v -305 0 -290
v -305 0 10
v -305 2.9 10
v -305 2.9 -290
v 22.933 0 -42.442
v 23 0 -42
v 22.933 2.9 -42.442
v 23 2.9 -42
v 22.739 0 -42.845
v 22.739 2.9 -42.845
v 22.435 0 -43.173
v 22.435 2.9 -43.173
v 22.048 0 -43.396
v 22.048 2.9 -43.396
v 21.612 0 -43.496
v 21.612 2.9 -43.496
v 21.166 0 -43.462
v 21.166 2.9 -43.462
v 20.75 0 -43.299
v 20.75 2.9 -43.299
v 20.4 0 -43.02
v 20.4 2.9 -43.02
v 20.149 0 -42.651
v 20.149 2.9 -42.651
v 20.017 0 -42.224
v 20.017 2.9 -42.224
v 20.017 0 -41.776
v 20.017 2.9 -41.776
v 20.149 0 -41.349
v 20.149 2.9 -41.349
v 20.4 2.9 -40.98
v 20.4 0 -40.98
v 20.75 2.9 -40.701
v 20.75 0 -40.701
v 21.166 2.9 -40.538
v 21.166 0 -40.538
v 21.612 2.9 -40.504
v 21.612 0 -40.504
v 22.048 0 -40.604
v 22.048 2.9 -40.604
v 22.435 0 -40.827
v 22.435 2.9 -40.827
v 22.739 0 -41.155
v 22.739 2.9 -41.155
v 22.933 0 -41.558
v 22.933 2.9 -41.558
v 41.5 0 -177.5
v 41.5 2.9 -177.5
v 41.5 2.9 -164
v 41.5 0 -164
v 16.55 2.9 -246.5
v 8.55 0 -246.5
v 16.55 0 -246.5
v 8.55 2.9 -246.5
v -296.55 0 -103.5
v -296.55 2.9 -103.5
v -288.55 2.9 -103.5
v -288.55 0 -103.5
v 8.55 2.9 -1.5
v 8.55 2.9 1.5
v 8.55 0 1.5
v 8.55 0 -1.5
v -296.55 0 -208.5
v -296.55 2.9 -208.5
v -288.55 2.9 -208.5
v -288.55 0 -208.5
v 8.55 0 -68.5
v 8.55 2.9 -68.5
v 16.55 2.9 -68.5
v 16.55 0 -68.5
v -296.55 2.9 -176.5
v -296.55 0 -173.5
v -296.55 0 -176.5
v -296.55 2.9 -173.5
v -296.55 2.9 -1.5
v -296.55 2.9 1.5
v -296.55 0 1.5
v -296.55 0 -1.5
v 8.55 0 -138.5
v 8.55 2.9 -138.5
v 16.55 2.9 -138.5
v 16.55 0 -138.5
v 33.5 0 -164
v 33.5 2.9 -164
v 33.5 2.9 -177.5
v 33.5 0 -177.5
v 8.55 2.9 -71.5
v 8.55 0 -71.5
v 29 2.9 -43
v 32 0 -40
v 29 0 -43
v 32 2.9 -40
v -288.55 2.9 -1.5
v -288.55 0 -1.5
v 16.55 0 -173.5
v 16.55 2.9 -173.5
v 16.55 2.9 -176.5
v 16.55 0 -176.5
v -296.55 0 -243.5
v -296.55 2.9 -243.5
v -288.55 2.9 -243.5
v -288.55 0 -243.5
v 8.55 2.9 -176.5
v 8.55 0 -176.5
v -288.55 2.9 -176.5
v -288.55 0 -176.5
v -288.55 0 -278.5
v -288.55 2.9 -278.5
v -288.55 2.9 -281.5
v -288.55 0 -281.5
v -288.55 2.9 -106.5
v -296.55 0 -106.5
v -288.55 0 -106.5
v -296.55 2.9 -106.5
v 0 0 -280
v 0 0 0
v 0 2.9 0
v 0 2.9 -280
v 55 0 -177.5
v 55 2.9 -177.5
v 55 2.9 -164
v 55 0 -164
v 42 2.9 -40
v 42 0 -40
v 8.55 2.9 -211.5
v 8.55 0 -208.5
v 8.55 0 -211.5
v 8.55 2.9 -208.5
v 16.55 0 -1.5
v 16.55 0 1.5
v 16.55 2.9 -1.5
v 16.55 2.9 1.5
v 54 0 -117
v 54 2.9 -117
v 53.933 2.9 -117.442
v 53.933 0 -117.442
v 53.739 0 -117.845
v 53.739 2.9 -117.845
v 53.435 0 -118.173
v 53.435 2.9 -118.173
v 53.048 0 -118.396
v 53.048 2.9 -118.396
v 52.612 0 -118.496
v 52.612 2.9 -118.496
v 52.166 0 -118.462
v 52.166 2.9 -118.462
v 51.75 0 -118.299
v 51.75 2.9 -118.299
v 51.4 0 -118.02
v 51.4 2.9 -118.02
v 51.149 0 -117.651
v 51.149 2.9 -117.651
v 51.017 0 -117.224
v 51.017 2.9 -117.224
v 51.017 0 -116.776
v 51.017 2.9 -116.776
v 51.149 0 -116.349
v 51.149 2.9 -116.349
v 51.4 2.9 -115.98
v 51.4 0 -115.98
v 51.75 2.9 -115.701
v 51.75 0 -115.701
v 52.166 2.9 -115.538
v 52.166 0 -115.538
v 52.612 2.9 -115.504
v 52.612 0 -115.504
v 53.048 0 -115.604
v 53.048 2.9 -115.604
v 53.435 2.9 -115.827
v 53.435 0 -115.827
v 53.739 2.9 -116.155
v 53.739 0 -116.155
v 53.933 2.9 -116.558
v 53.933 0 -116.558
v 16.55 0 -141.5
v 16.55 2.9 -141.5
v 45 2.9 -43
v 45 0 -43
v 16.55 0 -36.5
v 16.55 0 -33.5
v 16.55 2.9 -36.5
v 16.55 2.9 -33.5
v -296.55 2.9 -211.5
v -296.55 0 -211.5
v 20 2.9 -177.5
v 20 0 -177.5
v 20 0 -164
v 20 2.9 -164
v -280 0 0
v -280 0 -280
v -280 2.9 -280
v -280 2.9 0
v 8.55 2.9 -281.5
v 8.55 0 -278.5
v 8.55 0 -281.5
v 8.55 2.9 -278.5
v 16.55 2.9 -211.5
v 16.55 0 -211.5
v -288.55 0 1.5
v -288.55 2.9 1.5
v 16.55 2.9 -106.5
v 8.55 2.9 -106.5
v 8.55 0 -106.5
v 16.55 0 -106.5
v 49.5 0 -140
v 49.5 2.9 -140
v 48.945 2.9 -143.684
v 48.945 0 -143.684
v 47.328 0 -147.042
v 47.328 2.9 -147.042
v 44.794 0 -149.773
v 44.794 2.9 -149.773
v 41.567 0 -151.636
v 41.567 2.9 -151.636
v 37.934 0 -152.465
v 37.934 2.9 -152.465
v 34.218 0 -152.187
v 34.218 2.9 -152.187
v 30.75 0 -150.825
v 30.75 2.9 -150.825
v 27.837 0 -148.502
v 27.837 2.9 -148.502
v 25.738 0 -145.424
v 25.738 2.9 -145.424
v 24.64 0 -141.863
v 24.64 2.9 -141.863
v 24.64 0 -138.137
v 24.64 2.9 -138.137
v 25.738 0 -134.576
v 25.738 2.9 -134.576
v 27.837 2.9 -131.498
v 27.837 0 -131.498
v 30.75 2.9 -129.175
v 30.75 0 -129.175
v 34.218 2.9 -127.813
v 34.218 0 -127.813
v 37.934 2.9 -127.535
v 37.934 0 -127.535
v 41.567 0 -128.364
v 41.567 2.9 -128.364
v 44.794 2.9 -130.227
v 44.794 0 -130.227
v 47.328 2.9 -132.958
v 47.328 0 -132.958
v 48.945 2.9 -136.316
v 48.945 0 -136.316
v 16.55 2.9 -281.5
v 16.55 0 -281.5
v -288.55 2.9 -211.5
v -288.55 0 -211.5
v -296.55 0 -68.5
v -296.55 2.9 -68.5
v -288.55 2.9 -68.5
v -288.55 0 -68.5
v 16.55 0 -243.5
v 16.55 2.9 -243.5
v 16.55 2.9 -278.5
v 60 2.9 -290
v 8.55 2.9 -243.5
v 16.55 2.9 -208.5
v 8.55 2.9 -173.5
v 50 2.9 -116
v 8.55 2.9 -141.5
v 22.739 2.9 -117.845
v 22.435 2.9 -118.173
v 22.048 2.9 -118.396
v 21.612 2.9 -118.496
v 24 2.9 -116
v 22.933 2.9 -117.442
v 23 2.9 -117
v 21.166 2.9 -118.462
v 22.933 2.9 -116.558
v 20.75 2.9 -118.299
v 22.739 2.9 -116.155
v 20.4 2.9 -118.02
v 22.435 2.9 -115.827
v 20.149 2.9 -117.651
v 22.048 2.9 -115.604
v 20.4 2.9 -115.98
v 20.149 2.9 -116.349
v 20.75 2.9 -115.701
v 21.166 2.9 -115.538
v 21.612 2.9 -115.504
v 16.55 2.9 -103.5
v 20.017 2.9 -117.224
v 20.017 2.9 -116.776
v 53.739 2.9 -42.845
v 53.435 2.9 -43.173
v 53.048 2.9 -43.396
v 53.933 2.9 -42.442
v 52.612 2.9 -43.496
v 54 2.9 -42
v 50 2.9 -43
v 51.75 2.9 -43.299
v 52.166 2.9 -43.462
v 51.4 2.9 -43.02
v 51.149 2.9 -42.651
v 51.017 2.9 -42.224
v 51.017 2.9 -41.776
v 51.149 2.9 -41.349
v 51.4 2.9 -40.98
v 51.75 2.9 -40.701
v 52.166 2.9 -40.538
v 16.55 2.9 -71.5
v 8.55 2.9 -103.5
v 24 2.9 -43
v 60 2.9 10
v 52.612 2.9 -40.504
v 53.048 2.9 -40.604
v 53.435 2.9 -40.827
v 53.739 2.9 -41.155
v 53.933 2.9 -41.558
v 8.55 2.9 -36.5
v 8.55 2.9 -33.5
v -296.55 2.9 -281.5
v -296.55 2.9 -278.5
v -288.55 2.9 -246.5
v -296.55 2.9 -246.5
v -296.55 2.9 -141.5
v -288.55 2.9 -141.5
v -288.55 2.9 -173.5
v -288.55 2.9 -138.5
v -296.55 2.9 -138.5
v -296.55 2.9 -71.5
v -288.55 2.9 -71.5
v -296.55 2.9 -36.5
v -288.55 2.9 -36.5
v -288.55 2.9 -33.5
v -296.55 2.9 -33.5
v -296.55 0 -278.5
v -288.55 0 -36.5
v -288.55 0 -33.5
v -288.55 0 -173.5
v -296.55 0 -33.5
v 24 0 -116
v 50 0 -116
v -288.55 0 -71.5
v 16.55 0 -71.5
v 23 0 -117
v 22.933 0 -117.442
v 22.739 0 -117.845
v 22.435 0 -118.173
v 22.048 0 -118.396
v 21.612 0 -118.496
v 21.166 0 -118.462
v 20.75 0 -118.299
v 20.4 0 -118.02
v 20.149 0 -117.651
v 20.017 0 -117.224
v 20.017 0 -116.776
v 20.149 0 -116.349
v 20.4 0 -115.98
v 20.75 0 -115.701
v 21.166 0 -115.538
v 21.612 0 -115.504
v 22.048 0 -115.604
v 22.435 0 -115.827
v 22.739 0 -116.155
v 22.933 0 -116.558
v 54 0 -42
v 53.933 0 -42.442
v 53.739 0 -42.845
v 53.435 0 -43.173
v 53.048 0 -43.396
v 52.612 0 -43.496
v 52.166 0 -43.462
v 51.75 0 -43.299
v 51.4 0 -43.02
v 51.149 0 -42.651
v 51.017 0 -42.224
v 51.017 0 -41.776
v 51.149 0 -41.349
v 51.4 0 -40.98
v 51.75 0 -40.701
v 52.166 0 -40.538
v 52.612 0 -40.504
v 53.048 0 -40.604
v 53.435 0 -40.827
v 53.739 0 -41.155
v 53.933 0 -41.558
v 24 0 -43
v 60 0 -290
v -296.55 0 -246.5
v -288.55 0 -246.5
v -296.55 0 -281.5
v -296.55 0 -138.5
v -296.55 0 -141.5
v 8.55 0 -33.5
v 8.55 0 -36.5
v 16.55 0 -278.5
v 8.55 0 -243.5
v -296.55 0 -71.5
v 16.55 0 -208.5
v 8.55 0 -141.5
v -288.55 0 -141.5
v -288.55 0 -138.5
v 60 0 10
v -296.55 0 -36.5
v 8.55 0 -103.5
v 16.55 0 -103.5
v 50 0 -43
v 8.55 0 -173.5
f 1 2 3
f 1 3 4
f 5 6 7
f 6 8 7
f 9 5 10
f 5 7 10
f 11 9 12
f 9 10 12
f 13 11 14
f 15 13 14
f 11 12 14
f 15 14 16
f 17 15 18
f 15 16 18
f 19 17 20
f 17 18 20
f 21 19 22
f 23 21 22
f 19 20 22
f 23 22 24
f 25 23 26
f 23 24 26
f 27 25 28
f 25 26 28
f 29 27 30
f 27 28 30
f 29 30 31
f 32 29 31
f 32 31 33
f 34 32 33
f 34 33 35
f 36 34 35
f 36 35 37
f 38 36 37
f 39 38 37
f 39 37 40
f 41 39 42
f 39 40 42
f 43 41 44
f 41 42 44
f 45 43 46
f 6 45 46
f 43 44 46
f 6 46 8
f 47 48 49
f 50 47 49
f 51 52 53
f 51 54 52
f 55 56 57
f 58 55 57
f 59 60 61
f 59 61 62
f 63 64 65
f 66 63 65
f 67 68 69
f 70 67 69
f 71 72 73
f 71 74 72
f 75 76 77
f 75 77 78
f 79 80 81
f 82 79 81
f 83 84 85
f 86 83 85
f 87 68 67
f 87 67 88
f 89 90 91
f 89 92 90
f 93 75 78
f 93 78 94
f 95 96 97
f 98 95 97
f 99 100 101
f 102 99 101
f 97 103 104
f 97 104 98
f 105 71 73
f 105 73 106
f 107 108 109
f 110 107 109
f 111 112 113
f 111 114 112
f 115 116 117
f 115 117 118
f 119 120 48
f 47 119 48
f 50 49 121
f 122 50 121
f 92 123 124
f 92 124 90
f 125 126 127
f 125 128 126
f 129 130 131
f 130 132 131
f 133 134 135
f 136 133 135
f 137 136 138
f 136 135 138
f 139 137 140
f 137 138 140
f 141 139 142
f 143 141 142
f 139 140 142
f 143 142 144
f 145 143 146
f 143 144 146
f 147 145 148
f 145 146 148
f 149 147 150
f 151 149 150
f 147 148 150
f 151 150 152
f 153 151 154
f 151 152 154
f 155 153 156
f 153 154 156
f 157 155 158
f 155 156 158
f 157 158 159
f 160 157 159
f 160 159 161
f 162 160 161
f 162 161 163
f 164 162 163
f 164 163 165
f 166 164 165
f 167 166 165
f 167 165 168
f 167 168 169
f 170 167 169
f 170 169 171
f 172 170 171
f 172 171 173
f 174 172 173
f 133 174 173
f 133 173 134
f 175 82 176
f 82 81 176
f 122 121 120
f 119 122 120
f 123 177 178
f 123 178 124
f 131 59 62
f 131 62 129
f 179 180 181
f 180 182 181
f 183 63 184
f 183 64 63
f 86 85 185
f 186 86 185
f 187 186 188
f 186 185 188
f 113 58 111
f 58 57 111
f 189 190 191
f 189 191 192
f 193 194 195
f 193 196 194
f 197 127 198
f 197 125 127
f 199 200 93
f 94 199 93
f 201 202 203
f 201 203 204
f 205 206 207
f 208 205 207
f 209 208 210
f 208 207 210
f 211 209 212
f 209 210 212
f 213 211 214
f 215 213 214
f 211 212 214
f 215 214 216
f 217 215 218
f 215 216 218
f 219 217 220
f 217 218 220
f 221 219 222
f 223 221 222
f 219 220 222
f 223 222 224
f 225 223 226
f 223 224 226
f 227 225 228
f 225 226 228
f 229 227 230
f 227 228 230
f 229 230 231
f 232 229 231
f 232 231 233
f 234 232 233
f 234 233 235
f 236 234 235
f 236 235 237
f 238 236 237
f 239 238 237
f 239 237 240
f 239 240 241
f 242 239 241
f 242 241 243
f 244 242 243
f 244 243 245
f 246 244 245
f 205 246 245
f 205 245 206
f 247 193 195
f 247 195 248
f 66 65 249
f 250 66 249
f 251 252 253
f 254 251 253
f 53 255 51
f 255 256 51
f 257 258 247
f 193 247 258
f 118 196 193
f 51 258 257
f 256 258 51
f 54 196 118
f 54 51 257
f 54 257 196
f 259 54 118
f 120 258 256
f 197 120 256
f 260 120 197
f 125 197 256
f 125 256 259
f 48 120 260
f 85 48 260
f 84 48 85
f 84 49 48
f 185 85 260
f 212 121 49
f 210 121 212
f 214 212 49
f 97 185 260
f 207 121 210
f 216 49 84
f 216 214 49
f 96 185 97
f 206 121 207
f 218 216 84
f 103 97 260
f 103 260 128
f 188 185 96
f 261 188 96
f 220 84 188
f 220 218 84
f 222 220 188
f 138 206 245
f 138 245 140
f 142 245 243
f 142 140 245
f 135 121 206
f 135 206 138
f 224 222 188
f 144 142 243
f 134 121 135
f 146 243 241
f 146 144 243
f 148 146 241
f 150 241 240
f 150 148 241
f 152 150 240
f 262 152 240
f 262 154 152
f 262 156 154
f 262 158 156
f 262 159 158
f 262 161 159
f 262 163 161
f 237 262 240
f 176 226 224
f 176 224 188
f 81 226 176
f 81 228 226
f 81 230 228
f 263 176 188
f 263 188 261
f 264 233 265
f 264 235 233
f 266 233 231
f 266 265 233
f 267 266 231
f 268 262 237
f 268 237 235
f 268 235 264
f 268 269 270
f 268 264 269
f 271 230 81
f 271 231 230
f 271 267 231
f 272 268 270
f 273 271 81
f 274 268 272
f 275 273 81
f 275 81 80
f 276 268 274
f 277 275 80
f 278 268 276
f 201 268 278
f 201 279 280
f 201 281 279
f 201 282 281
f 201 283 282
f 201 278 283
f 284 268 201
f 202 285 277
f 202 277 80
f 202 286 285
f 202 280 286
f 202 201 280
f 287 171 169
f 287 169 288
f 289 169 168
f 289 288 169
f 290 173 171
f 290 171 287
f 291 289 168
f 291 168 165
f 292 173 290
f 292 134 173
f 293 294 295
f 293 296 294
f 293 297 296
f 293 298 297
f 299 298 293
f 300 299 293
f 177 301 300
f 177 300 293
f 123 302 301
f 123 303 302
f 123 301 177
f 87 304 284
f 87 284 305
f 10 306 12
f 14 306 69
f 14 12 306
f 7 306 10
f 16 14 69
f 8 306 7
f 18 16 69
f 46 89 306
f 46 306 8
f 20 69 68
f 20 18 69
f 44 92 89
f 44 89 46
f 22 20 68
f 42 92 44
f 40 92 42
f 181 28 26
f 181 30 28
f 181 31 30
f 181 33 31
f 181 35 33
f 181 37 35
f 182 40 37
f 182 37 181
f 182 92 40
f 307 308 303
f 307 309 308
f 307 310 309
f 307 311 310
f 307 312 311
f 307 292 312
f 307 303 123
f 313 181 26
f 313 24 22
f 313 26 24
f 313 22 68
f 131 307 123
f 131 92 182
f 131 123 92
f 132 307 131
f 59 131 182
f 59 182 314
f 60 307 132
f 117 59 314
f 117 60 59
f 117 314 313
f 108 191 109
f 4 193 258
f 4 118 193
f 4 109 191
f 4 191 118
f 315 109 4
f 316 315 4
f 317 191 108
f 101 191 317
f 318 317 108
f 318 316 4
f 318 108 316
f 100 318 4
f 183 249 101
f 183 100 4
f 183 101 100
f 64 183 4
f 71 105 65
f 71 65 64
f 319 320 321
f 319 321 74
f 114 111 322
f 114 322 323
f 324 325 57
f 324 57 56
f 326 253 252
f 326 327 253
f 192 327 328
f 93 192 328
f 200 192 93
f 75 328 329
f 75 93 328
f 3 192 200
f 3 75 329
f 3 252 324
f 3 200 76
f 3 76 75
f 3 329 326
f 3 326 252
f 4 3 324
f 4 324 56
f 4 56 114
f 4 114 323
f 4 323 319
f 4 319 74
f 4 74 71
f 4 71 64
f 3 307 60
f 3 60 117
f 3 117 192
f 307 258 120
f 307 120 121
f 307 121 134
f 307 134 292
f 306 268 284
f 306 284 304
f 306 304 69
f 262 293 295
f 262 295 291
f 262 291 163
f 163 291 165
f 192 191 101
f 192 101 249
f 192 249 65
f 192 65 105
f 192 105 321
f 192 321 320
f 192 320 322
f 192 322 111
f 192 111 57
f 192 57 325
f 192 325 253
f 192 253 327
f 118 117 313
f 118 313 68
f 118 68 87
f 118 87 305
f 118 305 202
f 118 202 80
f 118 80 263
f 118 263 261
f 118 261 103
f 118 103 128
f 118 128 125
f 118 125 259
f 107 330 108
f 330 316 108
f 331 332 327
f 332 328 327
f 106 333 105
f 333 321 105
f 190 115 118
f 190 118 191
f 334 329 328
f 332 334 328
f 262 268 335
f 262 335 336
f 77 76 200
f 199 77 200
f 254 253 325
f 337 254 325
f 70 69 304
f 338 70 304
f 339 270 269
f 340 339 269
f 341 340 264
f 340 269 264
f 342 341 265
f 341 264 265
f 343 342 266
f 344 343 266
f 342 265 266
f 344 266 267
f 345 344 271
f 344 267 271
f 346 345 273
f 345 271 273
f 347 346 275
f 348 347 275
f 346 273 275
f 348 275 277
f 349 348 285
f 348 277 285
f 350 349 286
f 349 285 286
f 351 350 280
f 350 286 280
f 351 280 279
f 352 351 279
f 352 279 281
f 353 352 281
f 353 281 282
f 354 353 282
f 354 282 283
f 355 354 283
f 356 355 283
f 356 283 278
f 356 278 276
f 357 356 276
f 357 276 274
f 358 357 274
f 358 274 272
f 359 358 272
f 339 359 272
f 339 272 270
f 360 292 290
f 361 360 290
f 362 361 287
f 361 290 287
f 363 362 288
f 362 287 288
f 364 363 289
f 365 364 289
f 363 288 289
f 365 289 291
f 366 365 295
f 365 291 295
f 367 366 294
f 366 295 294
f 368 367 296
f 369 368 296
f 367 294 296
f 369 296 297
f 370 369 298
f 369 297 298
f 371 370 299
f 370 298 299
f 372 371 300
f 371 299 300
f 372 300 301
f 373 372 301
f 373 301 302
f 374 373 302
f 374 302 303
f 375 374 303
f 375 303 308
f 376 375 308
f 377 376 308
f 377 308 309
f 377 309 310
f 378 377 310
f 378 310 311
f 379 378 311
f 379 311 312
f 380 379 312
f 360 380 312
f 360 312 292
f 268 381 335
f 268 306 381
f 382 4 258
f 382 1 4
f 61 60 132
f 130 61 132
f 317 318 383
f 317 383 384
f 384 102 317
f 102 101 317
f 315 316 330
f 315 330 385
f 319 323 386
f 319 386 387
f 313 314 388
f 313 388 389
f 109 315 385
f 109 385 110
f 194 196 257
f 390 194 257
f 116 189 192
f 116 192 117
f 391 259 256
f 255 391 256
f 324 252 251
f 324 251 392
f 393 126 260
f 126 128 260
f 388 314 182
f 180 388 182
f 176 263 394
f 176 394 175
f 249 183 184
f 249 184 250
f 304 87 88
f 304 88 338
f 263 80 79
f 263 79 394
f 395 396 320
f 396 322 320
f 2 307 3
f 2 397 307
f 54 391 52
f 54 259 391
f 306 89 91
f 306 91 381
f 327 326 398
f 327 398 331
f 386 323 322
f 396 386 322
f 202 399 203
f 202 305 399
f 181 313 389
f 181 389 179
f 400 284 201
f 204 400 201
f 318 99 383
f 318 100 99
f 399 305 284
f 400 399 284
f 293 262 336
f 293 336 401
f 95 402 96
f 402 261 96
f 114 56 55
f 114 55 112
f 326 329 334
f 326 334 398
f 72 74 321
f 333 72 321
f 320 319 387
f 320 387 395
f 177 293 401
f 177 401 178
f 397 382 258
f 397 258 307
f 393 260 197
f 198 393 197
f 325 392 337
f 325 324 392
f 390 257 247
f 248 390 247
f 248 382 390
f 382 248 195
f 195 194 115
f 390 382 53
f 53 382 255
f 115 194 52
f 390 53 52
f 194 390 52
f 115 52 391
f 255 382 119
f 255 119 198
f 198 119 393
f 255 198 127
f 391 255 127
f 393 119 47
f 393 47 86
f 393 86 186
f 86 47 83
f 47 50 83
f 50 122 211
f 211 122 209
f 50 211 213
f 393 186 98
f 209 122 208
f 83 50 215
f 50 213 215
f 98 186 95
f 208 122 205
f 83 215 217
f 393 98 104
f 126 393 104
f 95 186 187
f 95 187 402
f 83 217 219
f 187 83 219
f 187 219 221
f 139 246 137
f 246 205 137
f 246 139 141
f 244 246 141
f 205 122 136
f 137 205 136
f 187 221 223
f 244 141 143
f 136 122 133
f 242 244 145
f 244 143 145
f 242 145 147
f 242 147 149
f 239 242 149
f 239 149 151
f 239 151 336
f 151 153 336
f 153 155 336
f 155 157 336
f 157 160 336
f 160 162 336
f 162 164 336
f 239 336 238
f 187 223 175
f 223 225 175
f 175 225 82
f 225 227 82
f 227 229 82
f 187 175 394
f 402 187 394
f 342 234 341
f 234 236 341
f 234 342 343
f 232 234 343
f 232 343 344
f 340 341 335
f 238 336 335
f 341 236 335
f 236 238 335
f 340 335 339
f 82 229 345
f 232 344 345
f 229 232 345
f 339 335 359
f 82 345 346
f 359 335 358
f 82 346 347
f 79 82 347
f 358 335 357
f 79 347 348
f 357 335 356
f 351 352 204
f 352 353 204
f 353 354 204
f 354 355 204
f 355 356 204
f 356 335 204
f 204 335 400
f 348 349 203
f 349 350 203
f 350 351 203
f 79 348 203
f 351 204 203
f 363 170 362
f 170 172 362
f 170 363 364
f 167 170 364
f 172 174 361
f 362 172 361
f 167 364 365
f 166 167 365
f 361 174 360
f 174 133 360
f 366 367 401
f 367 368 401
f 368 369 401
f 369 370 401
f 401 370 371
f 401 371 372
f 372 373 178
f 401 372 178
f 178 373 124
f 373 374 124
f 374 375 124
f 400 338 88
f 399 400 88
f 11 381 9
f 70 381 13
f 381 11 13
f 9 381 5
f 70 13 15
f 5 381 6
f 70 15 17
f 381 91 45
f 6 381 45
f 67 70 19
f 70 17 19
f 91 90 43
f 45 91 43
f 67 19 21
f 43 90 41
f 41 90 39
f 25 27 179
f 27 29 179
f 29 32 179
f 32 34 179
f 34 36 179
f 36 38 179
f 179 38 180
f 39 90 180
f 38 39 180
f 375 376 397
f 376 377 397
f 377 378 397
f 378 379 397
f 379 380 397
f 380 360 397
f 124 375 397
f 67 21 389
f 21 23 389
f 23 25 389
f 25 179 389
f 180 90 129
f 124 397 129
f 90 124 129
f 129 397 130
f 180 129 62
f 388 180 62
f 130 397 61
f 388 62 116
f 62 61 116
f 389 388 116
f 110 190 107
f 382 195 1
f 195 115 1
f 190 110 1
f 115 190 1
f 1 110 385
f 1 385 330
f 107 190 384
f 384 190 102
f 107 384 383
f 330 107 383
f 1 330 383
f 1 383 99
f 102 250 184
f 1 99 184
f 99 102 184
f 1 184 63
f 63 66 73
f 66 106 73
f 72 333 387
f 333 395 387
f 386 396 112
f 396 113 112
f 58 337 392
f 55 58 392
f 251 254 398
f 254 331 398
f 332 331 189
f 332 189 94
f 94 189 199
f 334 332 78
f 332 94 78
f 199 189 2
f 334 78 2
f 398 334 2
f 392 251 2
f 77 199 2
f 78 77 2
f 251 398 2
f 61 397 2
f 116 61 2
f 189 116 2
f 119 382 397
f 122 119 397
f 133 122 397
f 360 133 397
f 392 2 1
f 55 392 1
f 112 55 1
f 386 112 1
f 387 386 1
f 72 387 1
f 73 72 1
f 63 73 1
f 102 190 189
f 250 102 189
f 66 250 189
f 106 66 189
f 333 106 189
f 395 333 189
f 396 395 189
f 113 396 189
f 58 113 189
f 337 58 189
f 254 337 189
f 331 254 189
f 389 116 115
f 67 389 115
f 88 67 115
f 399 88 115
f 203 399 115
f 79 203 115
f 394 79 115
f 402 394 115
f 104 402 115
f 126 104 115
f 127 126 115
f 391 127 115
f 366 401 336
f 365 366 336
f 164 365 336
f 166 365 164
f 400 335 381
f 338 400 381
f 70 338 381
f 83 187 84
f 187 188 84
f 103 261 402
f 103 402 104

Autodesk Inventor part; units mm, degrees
ref_plane "YZ Plane" through (0, 0, 0) normal (1, 0, 0) x (0, 1, 0)
ref_plane "XZ Plane" through (0, 0, 0) normal (0, 1, 0) x (-1, 0, 0)
ref_plane "XY Plane" through (0, 0, 0) normal (0, 0, 1) x (1, 0, 0)
sketch "Sketch1" plane through (0, 0, 0) normal (0, 1, 0) x (-1, 0, 0)
  line L0 (35, 0) -> (0, 0)
  line L1 (0, 0) -> (0, -35)
  line L2 (0, -35) -> (35, -35)
  line L3 (35, -35) -> (35, 0)
  line L4 (70, 0) -> (35, 0)
  line L5 (35, 0) -> (35, -35)
  line L6 (35, -35) -> (70, -35)
  line L7 (70, -35) -> (70, 0)
  line L8 (105, 0) -> (70, 0)
  line L9 (70, 0) -> (70, -35)
  line L10 (70, -35) -> (105, -35)
  line L11 (105, -35) -> (105, 0)
  line L12 (140, 0) -> (105, 0)
  line L13 (105, 0) -> (105, -35)
  line L14 (105, -35) -> (140, -35)
  line L15 (140, -35) -> (140, 0)
  line L16 (175, 0) -> (140, 0)
  line L17 (140, 0) -> (140, -35)
  line L18 (140, -35) -> (175, -35)
  line L19 (175, -35) -> (175, 0)
  line L20 (210, 0) -> (175, 0)
  line L21 (175, 0) -> (175, -35)
  line L22 (175, -35) -> (210, -35)
  line L23 (210, -35) -> (210, 0)
  line L24 (245, 0) -> (210, 0)
  line L25 (210, 0) -> (210, -35)
  line L26 (210, -35) -> (245, -35)
  line L27 (245, -35) -> (245, 0)
  line L28 (280, 0) -> (245, 0)
  line L29 (245, 0) -> (245, -35)
  line L30 (245, -35) -> (280, -35)
  line L31 (280, -35) -> (280, 0)
  line L32 (35, -35) -> (0, -35)
  line L33 (0, -35) -> (0, -70)
  line L34 (0, -70) -> (35, -70)
  line L35 (35, -70) -> (35, -35)
  line L36 (70, -35) -> (35, -35)
  line L37 (35, -35) -> (35, -70)
  line L38 (35, -70) -> (70, -70)
  line L39 (70, -70) -> (70, -35)
  line L40 (105, -35) -> (70, -35)
  line L41 (70, -35) -> (70, -70)
  line L42 (70, -70) -> (105, -70)
  line L43 (105, -70) -> (105, -35)
  line L44 (140, -35) -> (105, -35)
  line L45 (105, -35) -> (105, -70)
  line L46 (105, -70) -> (140, -70)
  line L47 (140, -70) -> (140, -35)
  line L48 (175, -35) -> (140, -35)
  line L49 (140, -35) -> (140, -70)
  line L50 (140, -70) -> (175, -70)
  line L51 (175, -70) -> (175, -35)
  line L52 (210, -35) -> (175, -35)
  line L53 (175, -35) -> (175, -70)
  line L54 (175, -70) -> (210, -70)
  line L55 (210, -70) -> (210, -35)
  line L56 (245, -35) -> (210, -35)
  line L57 (210, -35) -> (210, -70)
  line L58 (210, -70) -> (245, -70)
  line L59 (245, -70) -> (245, -35)
  line L60 (280, -35) -> (245, -35)
  line L61 (245, -35) -> (245, -70)
  line L62 (245, -70) -> (280, -70)
  line L63 (280, -70) -> (280, -35)
  line L64 (35, -70) -> (0, -70)
  line L65 (0, -70) -> (0, -105)
  line L66 (0, -105) -> (35, -105)
  line L67 (35, -105) -> (35, -70)
  line L68 (70, -70) -> (35, -70)
  line L69 (35, -70) -> (35, -105)
  line L70 (35, -105) -> (70, -105)
  line L71 (70, -105) -> (70, -70)
  line L72 (105, -70) -> (70, -70)
  line L73 (70, -70) -> (70, -105)
  line L74 (70, -105) -> (105, -105)
  line L75 (105, -105) -> (105, -70)
  line L76 (140, -70) -> (105, -70)
  line L77 (105, -70) -> (105, -105)
  line L78 (105, -105) -> (140, -105)
  line L79 (140, -105) -> (140, -70)
  line L80 (175, -70) -> (140, -70)
  line L81 (140, -70) -> (140, -105)
  line L82 (140, -105) -> (175, -105)
  line L83 (175, -105) -> (175, -70)
  line L84 (210, -70) -> (175, -70)
  line L85 (175, -70) -> (175, -105)
  line L86 (175, -105) -> (210, -105)
  line L87 (210, -105) -> (210, -70)
  line L88 (245, -70) -> (210, -70)
  line L89 (210, -70) -> (210, -105)
  line L90 (210, -105) -> (245, -105)
  line L91 (245, -105) -> (245, -70)
  line L92 (280, -70) -> (245, -70)
  line L93 (245, -70) -> (245, -105)
  line L94 (245, -105) -> (280, -105)
  line L95 (280, -105) -> (280, -70)
  line L96 (35, -105) -> (0, -105)
  line L97 (0, -105) -> (0, -140)
  line L98 (0, -140) -> (35, -140)
  line L99 (35, -140) -> (35, -105)
  line L100 (70, -105) -> (35, -105)
  line L101 (35, -105) -> (35, -140)
  line L102 (35, -140) -> (70, -140)
  line L103 (70, -140) -> (70, -105)
  line L104 (105, -105) -> (70, -105)
  line L105 (70, -105) -> (70, -140)
  line L106 (70, -140) -> (105, -140)
  line L107 (105, -140) -> (105, -105)
  line L108 (140, -105) -> (105, -105)
  line L109 (105, -105) -> (105, -140)
  line L110 (105, -140) -> (140, -140)
  line L111 (140, -140) -> (140, -105)
  line L112 (175, -105) -> (140, -105)
  line L113 (140, -105) -> (140, -140)
  line L114 (140, -140) -> (175, -140)
  line L115 (175, -140) -> (175, -105)
  line L116 (210, -105) -> (175, -105)
  line L117 (175, -105) -> (175, -140)
  line L118 (175, -140) -> (210, -140)
  line L119 (210, -140) -> (210, -105)
  line L120 (245, -105) -> (210, -105)
  line L121 (210, -105) -> (210, -140)
  line L122 (210, -140) -> (245, -140)
  line L123 (245, -140) -> (245, -105)
  line L124 (280, -105) -> (245, -105)
  line L125 (245, -105) -> (245, -140)
  line L126 (245, -140) -> (280, -140)
  line L127 (280, -140) -> (280, -105)
  line L128 (35, -140) -> (0, -140)
  line L129 (0, -140) -> (0, -175)
  line L130 (0, -175) -> (35, -175)
  line L131 (35, -175) -> (35, -140)
  line L132 (70, -140) -> (35, -140)
  line L133 (35, -140) -> (35, -175)
  line L134 (35, -175) -> (70, -175)
  line L135 (70, -175) -> (70, -140)
  line L136 (105, -140) -> (70, -140)
  line L137 (70, -140) -> (70, -175)
  line L138 (70, -175) -> (105, -175)
  line L139 (105, -175) -> (105, -140)
  line L140 (140, -140) -> (105, -140)
  line L141 (105, -140) -> (105, -175)
  line L142 (105, -175) -> (140, -175)
  line L143 (140, -175) -> (140, -140)
  line L144 (175, -140) -> (140, -140)
  line L145 (140, -140) -> (140, -175)
  line L146 (140, -175) -> (175, -175)
  line L147 (175, -175) -> (175, -140)
  line L148 (210, -140) -> (175, -140)
  line L149 (175, -140) -> (175, -175)
  line L150 (175, -175) -> (210, -175)
  line L151 (210, -175) -> (210, -140)
  line L152 (245, -140) -> (210, -140)
  line L153 (210, -140) -> (210, -175)
  line L154 (210, -175) -> (245, -175)
  line L155 (245, -175) -> (245, -140)
  line L156 (280, -140) -> (245, -140)
  line L157 (245, -140) -> (245, -175)
  line L158 (245, -175) -> (280, -175)
  line L159 (280, -175) -> (280, -140)
  line L160 (35, -175) -> (0, -175)
  line L161 (0, -175) -> (0, -210)
  line L162 (0, -210) -> (35, -210)
  line L163 (35, -210) -> (35, -175)
  line L164 (70, -175) -> (35, -175)
  line L165 (35, -175) -> (35, -210)
  line L166 (35, -210) -> (70, -210)
  line L167 (70, -210) -> (70, -175)
  line L168 (105, -175) -> (70, -175)
  line L169 (70, -175) -> (70, -210)
  line L170 (70, -210) -> (105, -210)
  line L171 (105, -210) -> (105, -175)
  line L172 (140, -175) -> (105, -175)
  line L173 (105, -175) -> (105, -210)
  line L174 (105, -210) -> (140, -210)
  line L175 (140, -210) -> (140, -175)
  line L176 (175, -175) -> (140, -175)
  line L177 (140, -175) -> (140, -210)
  line L178 (140, -210) -> (175, -210)
  line L179 (175, -210) -> (175, -175)
  line L180 (210, -175) -> (175, -175)
  line L181 (175, -175) -> (175, -210)
  line L182 (175, -210) -> (210, -210)
  line L183 (210, -210) -> (210, -175)
  line L184 (245, -175) -> (210, -175)
  line L185 (210, -175) -> (210, -210)
  line L186 (210, -210) -> (245, -210)
  line L187 (245, -210) -> (245, -175)
  line L188 (280, -175) -> (245, -175)
  line L189 (245, -175) -> (245, -210)
  line L190 (245, -210) -> (280, -210)
  line L191 (280, -210) -> (280, -175)
  line L192 (35, -210) -> (0, -210)
  line L193 (0, -210) -> (0, -245)
  line L194 (0, -245) -> (35, -245)
  line L195 (35, -245) -> (35, -210)
  line L196 (70, -210) -> (35, -210)
  line L197 (35, -210) -> (35, -245)
  line L198 (35, -245) -> (70, -245)
  line L199 (70, -245) -> (70, -210)
  line L200 (105, -210) -> (70, -210)
  line L201 (70, -210) -> (70, -245)
  line L202 (70, -245) -> (105, -245)
  line L203 (105, -245) -> (105, -210)
  line L204 (140, -210) -> (105, -210)
  line L205 (105, -210) -> (105, -245)
  line L206 (105, -245) -> (140, -245)
  line L207 (140, -245) -> (140, -210)
  line L208 (175, -210) -> (140, -210)
  line L209 (140, -210) -> (140, -245)
  line L210 (140, -245) -> (175, -245)
  line L211 (175, -245) -> (175, -210)
  line L212 (210, -210) -> (175, -210)
  line L213 (175, -210) -> (175, -245)
  line L214 (175, -245) -> (210, -245)
  line L215 (210, -245) -> (210, -210)
  line L216 (245, -210) -> (210, -210)
  line L217 (210, -210) -> (210, -245)
  line L218 (210, -245) -> (245, -245)
  line L219 (245, -245) -> (245, -210)
  line L220 (280, -210) -> (245, -210)
  line L221 (245, -210) -> (245, -245)
  line L222 (245, -245) -> (280, -245)
  line L223 (280, -245) -> (280, -210)
  line L224 (35, -245) -> (0, -245)
  line L225 (0, -245) -> (0, -280)
  line L226 (0, -280) -> (35, -280)
  line L227 (35, -280) -> (35, -245)
  line L228 (70, -245) -> (35, -245)
  line L229 (35, -245) -> (35, -280)
  line L230 (35, -280) -> (70, -280)
  line L231 (70, -280) -> (70, -245)
  line L232 (105, -245) -> (70, -245)
  line L233 (70, -245) -> (70, -280)
  line L234 (70, -280) -> (105, -280)
  line L235 (105, -280) -> (105, -245)
  line L236 (140, -245) -> (105, -245)
  line L237 (105, -245) -> (105, -280)
  line L238 (105, -280) -> (140, -280)
  line L239 (140, -280) -> (140, -245)
  line L240 (175, -245) -> (140, -245)
  line L241 (140, -245) -> (140, -280)
  line L242 (140, -280) -> (175, -280)
  line L243 (175, -280) -> (175, -245)
  line L244 (210, -245) -> (175, -245)
  line L245 (175, -245) -> (175, -280)
  line L246 (175, -280) -> (210, -280)
  line L247 (210, -280) -> (210, -245)
  line L248 (245, -245) -> (210, -245)
  line L249 (210, -245) -> (210, -280)
  line L250 (210, -280) -> (245, -280)
  line L251 (245, -280) -> (245, -245)
  line L252 (280, -245) -> (245, -245)
  line L253 (245, -245) -> (245, -280)
  line L254 (245, -280) -> (280, -280)
  line L255 (280, -280) -> (280, -245)
  line L256 (-60, 10) -> (305, 10)
  line L257 (305, 10) -> (305, -290)
  line L258 (305, -290) -> (-60, -290)
  line L259 (-60, -290) -> (-60, 10)
  point P0 (35, -70)
  point P1 (35, -70)
  point P2 (245, -105)
  point P3 (245, -105)
  point P4 (245, 0)
  point P5 (245, -35)
  point P6 (245, -35)
  point P7 (175, 0)
  point P8 (175, -35)
  point P9 (175, -35)
  point P10 (210, -35)
  point P11 (210, -35)
  point P12 (105, 0)
  point P13 (140, -35)
  point P14 (35, 0)
  point P15 (70, -35)
  point P16 (70, -35)
  point P17 (175, -70)
  point P18 (175, -70)
  point P19 (280, -35)
  point P20 (210, 0)
  point P21 (140, 0)
  point P22 (70, 0)
  dimension "d0" = 35
  dimension "d1" = 35
  dimension "d4" = 35
  dimension "d7" = 35
  dimension "d10" = 10
  dimension "d12" = 10
  dimension "d13" = 25
  dimension "d14" = 60
extrude "Border" add sketch "Sketch1" along normal blind 2.9
sketch "Sketch2" plane through (0, 2.9, 0) normal (0, 1, 0) x (1, 0, 0)
  line L0 (-296.55, 68.5) -> (-288.55, 68.5) projected
  line L1 (-288.55, 68.5) -> (-288.55, 71.5) projected
  line L2 (-296.55, 71.5) -> (-288.55, 71.5) projected
  line L3 (-296.55, 68.5) -> (-296.55, 71.5) projected
  line L4 (-296.55, 103.5) -> (-288.55, 103.5) projected
  line L5 (-288.55, 103.5) -> (-288.55, 106.5) projected
  line L6 (-296.55, 106.5) -> (-288.55, 106.5) projected
  line L7 (-296.55, 103.5) -> (-296.55, 106.5) projected
  line L8 (-296.55, 138.5) -> (-288.55, 138.5) projected
  line L9 (-288.55, 138.5) -> (-288.55, 141.5) projected
  line L10 (-296.55, 141.5) -> (-288.55, 141.5) projected
  line L11 (-296.55, 138.5) -> (-296.55, 141.5) projected
  line L12 (-296.55, 173.5) -> (-288.55, 173.5) projected
  line L13 (-288.55, 173.5) -> (-288.55, 176.5) projected
  line L14 (-296.55, 176.5) -> (-288.55, 176.5) projected
  line L15 (-296.55, 173.5) -> (-296.55, 176.5) projected
  line L16 (-296.55, 208.5) -> (-288.55, 208.5) projected
  line L17 (-288.55, 208.5) -> (-288.55, 211.5) projected
  line L18 (-296.55, 211.5) -> (-288.55, 211.5) projected
  line L19 (-296.55, 208.5) -> (-296.55, 211.5) projected
  line L20 (-296.55, 243.5) -> (-288.55, 243.5) projected
  line L21 (-288.55, 243.5) -> (-288.55, 246.5) projected
  line L22 (-296.55, 246.5) -> (-288.55, 246.5) projected
  line L23 (-296.55, 243.5) -> (-296.55, 246.5) projected
  line L24 (-296.55, 278.5) -> (-288.55, 278.5) projected
  line L25 (-288.55, 278.5) -> (-288.55, 281.5) projected
  line L26 (-296.55, 281.5) -> (-288.55, 281.5) projected
  line L27 (-296.55, 278.5) -> (-296.55, 281.5) projected
  line L28 (8.55, 278.5) -> (16.55, 278.5) projected
  line L29 (16.55, 278.5) -> (16.55, 281.5) projected
  line L30 (8.55, 281.5) -> (16.55, 281.5) projected
  line L31 (8.55, 278.5) -> (8.55, 281.5) projected
  line L32 (8.55, 243.5) -> (16.55, 243.5) projected
  line L33 (16.55, 243.5) -> (16.55, 246.5) projected
  line L34 (8.55, 246.5) -> (16.55, 246.5) projected
  line L35 (8.55, 243.5) -> (8.55, 246.5) projected
  line L36 (8.55, 103.5) -> (16.55, 103.5) projected
  line L37 (16.55, 103.5) -> (16.55, 106.5) projected
  line L38 (8.55, 106.5) -> (16.55, 106.5) projected
  line L39 (8.55, 103.5) -> (8.55, 106.5) projected
  line L40 (8.55, 138.5) -> (16.55, 138.5) projected
  line L41 (16.55, 138.5) -> (16.55, 141.5) projected
  line L42 (8.55, 141.5) -> (16.55, 141.5) projected
  line L43 (8.55, 138.5) -> (8.55, 141.5) projected
  line L44 (8.55, 208.5) -> (16.55, 208.5) projected
  line L45 (16.55, 208.5) -> (16.55, 211.5) projected
  line L46 (8.55, 211.5) -> (16.55, 211.5) projected
  line L47 (8.55, 208.5) -> (8.55, 211.5) projected
  line L48 (8.55, 173.5) -> (16.55, 173.5) projected
  line L49 (16.55, 173.5) -> (16.55, 176.5) projected
  line L50 (8.55, 176.5) -> (16.55, 176.5) projected
  line L51 (8.55, 173.5) -> (8.55, 176.5) projected
  line L52 (8.55, -1.5) -> (16.55, -1.5) projected
  line L53 (16.55, -1.5) -> (16.55, 1.5) projected
  line L54 (8.55, 1.5) -> (16.55, 1.5) projected
  line L55 (8.55, -1.5) -> (8.55, 1.5) projected
  line L56 (8.55, 33.5) -> (16.55, 33.5) projected
  line L57 (16.55, 33.5) -> (16.55, 36.5) projected
  line L58 (8.55, 36.5) -> (16.55, 36.5) projected
  line L59 (8.55, 33.5) -> (8.55, 36.5) projected
  line L60 (8.55, 68.5) -> (16.55, 68.5) projected
  line L61 (16.55, 68.5) -> (16.55, 71.5) projected
  line L62 (8.55, 71.5) -> (16.55, 71.5) projected
  line L63 (8.55, 68.5) -> (8.55, 71.5) projected
  line L64 (-296.55, -1.5) -> (-288.55, -1.5) projected
  line L65 (-288.55, -1.5) -> (-288.55, 1.5) projected
  line L66 (-296.55, 1.5) -> (-288.55, 1.5) projected
  line L67 (-296.55, -1.5) -> (-296.55, 1.5) projected
  line L68 (-296.55, 33.5) -> (-288.55, 33.5) projected
  line L69 (-288.55, 33.5) -> (-288.55, 36.5) projected
  line L70 (-296.55, 36.5) -> (-288.55, 36.5) projected
  line L71 (-296.55, 33.5) -> (-296.55, 36.5) projected
extrude "SeperatorPinSlots" cut sketch "Sketch2" against normal through all
sketch "Sketch3" plane through (0, 2.9, 0) normal (0, 1, 0) x (1, 0, 0)
  line L0 (24, 43) -> (24, 116)
  line L1 (24, 116) -> (50, 116)
  line L2 (50, 116) -> (50, 43)
  line L3 (37, 40) -> (37, -10) construction
  line L4 (-305, -10) -> (60, -10) projected
  line L5 (60, 290) -> (-305, 290) projected
  line L6 (60, -10) -> (60, 290) projected
  circle A0 centre (21.5, 117) radius 1.5
  circle A1 centre (52.5, 117) radius 1.5
  circle A2 centre (52.5, 42) radius 1.5
  circle A3 centre (21.5, 42) radius 1.5
  line L7 (52.5, 42) -> (52.5, 79.5) construction
  line L8 (21.5, 42) -> (37, 42) construction
  line L9 (37, 42) -> (52.5, 42) construction
  line L10 (50, 43) -> (45, 43)
  line L11 (45, 43) -> (42, 40)
  line L12 (42, 40) -> (32, 40)
  line L13 (32, 40) -> (29, 43)
  line L14 (29, 43) -> (24, 43)
  line L15 (60, -10) -> (60, 290) projected
  line L16 (41.5, 164) -> (55, 164)
  line L17 (55, 164) -> (55, 177.5)
  line L18 (55, 177.5) -> (41.5, 177.5)
  line L19 (41.5, 177.5) -> (41.5, 164)
  line L20 (20, 164) -> (33.5, 164)
  line L21 (33.5, 164) -> (33.5, 177.5)
  line L22 (33.5, 177.5) -> (20, 177.5)
  line L23 (20, 177.5) -> (20, 164)
  line L24 (-305, 290) -> (-305, -10) projected
  circle A4 centre (37, 140) radius 12.5
  point P0 (26.5, 43)
  point P1 (-122.5, 290)
  dimension "d23" = 73
  dimension "d24" = 26
  dimension "d26" = 3
  dimension "d27" = 3
  dimension "d28" = 3
  dimension "d29" = 3
  dimension "d30" = 31
  dimension "d31" = 75
  dimension "d34" = 135
  dimension "d35" = 135
  dimension "d36" = 10
  dimension "d37" = 3
  dimension "d41" = 13.5
  dimension "d42" = 13.5
  dimension "d43" = 8
  dimension "d44" = 5
  dimension "d48" = 50
  dimension "d49" = 1
  dimension "d50" = 10
  dimension "d51" = 25
  dimension "d52" = 24
  dimension "d53" = 24
extrude "Controls" cut sketch "Sketch3" against normal up to surface (2.9 mm away) contours L0 L1 L2 L10 L11 L12 L13 L14 | A0 | A1 | A2 | A3 | L19 L18 L17 L16 | L23 L22 L21 L20 | A4
properties part number "Board"
